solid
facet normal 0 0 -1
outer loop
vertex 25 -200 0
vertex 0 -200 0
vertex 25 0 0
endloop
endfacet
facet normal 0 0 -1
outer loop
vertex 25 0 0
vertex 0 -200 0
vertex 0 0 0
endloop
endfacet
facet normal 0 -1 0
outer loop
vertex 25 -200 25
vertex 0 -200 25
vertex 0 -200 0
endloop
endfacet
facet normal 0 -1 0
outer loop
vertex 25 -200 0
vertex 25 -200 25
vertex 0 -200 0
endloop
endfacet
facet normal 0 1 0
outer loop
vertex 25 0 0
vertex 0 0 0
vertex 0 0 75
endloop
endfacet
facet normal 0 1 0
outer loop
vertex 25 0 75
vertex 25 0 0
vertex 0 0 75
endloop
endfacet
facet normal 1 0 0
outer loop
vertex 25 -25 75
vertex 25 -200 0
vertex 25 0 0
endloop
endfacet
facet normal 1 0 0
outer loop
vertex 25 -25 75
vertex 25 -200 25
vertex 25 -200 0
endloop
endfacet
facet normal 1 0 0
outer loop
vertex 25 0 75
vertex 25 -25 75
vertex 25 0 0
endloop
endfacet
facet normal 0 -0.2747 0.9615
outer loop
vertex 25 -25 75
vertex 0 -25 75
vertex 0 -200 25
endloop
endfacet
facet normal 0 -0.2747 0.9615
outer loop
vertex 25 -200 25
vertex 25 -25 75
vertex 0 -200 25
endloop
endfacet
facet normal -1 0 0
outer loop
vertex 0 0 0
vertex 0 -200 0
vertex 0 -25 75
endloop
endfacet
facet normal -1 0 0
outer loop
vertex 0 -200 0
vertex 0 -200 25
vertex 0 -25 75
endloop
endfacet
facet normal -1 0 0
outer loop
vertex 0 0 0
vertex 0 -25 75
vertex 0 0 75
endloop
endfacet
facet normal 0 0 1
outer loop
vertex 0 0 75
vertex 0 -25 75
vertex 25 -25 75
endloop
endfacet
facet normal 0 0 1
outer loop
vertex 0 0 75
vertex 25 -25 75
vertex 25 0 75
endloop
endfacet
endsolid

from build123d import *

# Parameters (mm, degrees)
F0_W     = 25
F0_H     = 50
F1_DEPTH = 25


with BuildPart() as f1:
    # F0 (on Right) → F1 (new body)
    with BuildSketch(Plane.YZ):
        Polygon((-200, 0), (0, 0), (0, 25), (-25, 25), (-200, 25), align=None)
        with Locations((-12.5, 50)):
            Rectangle(F0_W, F0_H)
        Polygon((-25, 75), (-200, 25), (-25, 25), align=None)
    extrude(amount=F1_DEPTH)


solid = f1.part
